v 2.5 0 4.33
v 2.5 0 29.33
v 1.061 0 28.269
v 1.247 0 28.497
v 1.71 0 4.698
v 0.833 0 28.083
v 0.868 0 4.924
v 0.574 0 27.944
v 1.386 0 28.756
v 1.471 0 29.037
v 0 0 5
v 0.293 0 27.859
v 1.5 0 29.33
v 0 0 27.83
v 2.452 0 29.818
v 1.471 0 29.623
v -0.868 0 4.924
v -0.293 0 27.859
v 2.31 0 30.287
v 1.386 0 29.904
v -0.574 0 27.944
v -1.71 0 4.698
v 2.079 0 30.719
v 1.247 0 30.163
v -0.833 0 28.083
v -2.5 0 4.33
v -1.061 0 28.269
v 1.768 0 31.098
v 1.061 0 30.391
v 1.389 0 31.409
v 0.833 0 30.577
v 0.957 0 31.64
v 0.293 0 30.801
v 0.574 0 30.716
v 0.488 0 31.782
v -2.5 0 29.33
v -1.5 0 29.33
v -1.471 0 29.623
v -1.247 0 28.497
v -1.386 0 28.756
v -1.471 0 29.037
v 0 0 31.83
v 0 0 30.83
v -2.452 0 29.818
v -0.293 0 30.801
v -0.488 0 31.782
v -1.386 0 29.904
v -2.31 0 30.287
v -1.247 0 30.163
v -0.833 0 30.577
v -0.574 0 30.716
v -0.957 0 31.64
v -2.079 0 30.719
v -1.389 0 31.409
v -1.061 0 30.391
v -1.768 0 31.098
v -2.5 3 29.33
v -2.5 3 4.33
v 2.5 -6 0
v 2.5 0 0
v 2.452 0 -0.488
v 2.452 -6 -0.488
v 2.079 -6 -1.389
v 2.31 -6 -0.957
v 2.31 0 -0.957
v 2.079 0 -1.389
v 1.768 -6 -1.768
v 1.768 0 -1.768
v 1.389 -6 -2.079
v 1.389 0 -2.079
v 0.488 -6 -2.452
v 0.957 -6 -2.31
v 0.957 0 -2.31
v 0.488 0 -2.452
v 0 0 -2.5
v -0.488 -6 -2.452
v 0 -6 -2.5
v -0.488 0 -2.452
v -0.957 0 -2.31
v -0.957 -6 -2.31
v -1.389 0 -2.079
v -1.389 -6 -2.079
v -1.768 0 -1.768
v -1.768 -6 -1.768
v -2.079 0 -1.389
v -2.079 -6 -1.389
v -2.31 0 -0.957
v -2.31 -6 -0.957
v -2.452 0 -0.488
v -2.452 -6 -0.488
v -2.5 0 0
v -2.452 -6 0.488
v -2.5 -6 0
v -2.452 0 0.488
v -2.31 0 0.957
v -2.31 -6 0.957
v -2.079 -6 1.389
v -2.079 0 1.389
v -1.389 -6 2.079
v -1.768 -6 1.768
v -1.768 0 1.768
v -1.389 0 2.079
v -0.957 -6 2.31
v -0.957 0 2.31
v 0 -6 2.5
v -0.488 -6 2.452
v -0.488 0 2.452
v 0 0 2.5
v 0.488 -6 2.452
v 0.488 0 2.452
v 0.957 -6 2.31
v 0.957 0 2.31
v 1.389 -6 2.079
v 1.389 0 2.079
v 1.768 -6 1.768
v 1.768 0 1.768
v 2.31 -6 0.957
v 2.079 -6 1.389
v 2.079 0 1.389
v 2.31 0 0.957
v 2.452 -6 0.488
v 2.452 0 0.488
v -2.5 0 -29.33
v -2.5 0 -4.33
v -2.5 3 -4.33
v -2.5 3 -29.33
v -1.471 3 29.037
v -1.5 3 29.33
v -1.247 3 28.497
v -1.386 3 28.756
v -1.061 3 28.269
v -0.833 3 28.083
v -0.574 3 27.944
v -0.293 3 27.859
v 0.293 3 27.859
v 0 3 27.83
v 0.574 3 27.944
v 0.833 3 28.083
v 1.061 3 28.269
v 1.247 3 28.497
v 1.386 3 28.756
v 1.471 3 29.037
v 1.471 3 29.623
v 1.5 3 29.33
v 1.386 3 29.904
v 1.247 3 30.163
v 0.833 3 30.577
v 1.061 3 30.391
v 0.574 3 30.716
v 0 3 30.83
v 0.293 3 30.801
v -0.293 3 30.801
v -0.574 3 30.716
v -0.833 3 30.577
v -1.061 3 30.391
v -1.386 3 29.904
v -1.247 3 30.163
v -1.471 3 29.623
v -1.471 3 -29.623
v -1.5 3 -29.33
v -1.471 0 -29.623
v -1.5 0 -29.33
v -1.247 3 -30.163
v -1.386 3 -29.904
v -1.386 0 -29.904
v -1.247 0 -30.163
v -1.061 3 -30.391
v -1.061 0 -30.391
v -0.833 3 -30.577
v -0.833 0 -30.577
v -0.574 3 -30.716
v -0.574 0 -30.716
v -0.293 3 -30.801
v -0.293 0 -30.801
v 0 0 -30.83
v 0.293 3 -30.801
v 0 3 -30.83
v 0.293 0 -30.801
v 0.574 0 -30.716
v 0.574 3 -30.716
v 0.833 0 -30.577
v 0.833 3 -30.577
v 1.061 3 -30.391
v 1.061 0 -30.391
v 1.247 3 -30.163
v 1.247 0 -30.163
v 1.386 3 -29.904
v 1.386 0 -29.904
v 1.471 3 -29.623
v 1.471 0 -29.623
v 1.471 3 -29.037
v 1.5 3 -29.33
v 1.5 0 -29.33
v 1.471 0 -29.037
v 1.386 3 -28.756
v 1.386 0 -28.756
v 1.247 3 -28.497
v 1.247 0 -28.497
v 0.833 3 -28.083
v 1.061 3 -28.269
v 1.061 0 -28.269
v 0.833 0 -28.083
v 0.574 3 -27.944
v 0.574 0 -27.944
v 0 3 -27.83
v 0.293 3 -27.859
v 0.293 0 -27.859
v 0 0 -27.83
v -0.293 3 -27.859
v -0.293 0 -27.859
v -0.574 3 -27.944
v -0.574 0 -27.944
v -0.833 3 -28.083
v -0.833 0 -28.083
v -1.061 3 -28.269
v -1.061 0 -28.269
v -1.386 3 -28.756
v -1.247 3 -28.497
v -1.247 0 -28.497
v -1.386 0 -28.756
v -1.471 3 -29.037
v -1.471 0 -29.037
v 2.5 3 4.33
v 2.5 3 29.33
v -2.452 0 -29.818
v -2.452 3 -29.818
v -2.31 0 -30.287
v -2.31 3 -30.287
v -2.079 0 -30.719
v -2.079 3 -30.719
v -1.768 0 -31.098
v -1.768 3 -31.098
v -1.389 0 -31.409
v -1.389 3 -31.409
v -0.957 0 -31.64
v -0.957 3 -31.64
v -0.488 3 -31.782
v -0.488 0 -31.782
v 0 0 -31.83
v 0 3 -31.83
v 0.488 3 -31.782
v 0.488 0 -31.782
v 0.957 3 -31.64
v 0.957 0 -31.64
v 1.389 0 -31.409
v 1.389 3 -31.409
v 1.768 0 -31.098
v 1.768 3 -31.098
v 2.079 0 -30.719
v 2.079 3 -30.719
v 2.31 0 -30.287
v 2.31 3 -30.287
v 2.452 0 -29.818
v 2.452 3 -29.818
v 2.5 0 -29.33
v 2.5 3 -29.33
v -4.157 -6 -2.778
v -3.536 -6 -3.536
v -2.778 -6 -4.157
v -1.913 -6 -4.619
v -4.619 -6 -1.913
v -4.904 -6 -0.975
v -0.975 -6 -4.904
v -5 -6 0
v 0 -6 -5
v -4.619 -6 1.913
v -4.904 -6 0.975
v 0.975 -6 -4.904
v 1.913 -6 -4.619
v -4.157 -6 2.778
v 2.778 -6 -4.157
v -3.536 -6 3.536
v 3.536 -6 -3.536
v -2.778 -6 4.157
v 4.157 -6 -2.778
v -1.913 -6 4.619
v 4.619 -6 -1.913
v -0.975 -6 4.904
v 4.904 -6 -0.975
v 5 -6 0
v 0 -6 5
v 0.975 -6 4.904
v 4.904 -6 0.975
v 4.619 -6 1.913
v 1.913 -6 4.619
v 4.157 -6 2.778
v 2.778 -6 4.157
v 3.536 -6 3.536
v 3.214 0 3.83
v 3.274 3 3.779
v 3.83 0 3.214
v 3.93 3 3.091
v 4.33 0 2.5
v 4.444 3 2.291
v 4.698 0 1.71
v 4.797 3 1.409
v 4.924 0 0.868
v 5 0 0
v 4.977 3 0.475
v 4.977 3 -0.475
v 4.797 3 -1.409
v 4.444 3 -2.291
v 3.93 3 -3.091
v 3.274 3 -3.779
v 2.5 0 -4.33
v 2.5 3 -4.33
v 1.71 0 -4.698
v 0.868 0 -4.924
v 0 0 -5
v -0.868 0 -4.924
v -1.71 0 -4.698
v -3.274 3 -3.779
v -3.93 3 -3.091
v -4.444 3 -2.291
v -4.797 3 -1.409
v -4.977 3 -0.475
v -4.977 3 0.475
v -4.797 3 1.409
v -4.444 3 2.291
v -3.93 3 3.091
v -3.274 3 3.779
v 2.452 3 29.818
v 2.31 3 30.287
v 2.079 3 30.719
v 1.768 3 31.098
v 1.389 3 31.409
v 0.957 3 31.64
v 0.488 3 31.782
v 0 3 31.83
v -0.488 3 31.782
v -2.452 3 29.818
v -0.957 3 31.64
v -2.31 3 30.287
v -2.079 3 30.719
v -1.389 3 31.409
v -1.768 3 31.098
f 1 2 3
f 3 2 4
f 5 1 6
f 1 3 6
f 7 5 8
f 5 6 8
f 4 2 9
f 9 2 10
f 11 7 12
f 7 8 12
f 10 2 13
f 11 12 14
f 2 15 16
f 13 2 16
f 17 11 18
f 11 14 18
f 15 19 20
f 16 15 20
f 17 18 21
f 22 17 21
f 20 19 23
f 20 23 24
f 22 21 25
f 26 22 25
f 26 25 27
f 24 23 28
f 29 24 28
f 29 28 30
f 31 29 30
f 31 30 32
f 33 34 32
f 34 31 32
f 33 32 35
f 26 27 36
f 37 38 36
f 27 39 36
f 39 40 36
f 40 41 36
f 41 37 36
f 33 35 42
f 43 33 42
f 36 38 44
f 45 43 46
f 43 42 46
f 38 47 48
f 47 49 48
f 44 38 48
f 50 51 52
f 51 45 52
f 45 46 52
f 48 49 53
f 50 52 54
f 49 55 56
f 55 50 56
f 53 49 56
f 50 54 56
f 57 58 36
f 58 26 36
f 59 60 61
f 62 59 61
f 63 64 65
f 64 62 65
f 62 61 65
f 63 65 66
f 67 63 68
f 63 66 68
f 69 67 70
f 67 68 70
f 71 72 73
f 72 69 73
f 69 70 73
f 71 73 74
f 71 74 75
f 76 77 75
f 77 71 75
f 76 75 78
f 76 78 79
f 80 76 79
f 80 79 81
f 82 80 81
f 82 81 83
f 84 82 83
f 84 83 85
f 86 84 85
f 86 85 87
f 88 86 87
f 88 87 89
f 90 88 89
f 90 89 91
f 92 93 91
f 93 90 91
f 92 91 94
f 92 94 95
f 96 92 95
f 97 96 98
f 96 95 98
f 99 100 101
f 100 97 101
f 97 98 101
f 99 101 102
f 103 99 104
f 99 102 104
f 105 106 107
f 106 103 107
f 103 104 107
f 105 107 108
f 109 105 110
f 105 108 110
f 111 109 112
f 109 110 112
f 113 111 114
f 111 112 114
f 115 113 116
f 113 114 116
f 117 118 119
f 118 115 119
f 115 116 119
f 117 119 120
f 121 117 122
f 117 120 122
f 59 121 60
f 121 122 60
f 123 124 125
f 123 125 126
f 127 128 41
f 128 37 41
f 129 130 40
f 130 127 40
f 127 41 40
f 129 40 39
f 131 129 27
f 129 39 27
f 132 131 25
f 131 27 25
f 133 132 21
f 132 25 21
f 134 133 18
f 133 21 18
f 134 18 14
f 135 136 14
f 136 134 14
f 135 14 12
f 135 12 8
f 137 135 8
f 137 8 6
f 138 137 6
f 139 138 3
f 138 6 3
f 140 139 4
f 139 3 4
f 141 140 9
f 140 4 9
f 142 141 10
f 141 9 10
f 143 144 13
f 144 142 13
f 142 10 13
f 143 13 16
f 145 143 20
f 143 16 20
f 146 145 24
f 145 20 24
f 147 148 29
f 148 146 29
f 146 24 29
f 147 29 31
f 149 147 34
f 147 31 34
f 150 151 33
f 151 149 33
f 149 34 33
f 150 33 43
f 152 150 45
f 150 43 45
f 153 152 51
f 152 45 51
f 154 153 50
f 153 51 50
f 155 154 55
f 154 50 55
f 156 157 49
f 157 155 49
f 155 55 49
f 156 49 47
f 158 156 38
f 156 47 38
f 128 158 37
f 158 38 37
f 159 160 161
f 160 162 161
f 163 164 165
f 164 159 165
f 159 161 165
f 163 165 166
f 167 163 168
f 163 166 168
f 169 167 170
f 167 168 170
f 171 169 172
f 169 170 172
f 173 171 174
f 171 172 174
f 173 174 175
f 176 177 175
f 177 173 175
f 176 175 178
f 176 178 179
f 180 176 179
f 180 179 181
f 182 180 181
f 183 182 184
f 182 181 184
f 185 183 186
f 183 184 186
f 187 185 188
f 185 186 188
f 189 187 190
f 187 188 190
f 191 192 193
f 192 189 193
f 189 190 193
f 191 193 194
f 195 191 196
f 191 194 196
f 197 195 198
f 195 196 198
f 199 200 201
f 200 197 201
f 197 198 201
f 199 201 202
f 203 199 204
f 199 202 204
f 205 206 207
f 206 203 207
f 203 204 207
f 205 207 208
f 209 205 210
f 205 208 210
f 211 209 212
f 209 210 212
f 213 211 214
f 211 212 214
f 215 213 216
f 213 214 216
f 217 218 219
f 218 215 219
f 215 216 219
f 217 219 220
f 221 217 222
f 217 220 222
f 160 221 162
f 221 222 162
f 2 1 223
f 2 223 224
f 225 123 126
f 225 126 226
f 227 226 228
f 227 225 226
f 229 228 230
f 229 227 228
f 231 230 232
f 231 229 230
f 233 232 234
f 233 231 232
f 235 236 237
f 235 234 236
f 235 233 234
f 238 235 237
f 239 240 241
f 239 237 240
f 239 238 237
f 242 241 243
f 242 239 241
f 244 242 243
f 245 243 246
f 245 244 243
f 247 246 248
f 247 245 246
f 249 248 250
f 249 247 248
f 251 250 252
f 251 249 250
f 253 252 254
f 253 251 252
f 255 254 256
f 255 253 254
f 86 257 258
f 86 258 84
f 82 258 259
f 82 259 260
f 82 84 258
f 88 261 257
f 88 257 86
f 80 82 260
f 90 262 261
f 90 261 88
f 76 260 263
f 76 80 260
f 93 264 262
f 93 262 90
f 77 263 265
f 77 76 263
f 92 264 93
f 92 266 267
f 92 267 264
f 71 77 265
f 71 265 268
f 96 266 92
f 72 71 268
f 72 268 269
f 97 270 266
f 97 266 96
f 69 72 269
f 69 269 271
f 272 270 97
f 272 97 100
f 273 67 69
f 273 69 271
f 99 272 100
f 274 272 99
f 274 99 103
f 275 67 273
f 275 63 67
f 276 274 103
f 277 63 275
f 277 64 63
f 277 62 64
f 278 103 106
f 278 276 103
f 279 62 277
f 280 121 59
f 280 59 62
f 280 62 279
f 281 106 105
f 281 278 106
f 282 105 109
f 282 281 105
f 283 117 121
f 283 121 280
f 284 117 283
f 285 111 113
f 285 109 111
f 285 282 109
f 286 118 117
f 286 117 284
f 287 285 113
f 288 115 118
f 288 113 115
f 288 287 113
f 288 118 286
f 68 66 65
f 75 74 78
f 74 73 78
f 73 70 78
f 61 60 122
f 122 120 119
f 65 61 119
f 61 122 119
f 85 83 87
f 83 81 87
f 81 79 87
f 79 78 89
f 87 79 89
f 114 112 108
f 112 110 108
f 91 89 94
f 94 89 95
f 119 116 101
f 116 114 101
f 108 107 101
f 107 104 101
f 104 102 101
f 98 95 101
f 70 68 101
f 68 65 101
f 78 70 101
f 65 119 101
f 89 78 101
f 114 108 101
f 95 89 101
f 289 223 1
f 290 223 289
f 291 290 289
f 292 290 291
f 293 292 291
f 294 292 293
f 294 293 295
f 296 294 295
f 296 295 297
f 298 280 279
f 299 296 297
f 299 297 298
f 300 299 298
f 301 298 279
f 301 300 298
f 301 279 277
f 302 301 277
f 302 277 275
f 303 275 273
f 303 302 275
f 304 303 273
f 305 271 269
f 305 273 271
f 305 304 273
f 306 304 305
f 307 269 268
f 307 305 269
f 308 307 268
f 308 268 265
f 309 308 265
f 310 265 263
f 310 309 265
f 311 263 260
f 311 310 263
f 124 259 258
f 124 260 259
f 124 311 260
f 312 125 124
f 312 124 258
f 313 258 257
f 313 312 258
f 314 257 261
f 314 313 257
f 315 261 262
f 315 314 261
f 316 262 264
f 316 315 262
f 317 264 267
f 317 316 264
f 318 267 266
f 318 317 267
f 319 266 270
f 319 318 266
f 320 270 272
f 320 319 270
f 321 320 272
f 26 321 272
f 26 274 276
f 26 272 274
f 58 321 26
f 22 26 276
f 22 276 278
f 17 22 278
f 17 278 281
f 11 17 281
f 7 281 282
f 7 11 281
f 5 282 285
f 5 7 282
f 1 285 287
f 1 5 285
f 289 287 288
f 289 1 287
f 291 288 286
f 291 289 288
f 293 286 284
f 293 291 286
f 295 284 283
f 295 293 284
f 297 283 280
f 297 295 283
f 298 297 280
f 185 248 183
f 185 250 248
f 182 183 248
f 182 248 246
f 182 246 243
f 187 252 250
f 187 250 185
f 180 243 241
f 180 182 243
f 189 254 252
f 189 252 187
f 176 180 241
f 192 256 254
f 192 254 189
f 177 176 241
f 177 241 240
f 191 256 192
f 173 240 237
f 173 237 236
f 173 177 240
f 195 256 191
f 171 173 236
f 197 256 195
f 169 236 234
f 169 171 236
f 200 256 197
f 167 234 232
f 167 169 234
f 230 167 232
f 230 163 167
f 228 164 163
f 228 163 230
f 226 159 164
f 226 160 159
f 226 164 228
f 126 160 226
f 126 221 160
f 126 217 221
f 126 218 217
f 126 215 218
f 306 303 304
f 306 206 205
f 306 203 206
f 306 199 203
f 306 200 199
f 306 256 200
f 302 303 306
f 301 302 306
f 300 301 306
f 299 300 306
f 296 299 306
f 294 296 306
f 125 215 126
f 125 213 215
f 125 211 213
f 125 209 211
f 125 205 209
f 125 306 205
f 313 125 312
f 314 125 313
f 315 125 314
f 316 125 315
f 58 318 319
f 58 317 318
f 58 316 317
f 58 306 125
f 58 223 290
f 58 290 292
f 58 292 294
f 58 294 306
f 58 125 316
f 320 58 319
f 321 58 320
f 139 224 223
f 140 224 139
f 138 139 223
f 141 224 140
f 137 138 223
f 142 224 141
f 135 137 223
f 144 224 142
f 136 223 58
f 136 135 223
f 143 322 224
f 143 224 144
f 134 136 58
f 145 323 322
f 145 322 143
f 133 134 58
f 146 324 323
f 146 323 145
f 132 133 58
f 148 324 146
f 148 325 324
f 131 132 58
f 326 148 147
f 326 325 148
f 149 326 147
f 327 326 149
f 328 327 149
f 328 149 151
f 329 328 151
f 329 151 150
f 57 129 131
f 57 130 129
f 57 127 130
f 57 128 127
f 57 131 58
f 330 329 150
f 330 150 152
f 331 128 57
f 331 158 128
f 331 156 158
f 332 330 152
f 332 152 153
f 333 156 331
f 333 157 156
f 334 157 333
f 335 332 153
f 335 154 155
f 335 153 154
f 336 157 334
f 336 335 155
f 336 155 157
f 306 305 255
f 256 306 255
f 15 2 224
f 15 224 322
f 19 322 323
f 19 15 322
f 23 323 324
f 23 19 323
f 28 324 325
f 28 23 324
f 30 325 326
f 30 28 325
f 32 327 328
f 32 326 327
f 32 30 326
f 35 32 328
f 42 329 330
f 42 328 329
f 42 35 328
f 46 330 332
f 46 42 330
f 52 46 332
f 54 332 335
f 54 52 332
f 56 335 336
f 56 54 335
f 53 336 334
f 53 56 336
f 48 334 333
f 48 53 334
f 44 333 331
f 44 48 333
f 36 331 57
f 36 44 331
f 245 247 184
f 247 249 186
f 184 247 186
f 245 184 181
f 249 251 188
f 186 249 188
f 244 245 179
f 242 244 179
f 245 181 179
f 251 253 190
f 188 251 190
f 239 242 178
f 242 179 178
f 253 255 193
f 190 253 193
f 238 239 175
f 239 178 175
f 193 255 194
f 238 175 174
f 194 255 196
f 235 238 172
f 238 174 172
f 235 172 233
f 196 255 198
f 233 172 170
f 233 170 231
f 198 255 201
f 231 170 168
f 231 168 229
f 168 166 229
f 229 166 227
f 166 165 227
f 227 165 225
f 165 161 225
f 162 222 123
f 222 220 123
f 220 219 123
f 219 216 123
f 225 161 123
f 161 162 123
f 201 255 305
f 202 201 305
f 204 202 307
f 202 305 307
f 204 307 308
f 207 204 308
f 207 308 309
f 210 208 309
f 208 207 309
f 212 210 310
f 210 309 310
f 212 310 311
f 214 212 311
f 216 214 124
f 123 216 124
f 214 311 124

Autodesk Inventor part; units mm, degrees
ref_plane "YZ Plane" through (0, 0, 0) normal (1, 0, 0) x (0, 1, 0)
ref_plane "XZ Plane" through (0, 0, 0) normal (0, 1, 0) x (-1, 0, 0)
ref_plane "XY Plane" through (0, 0, 0) normal (0, 0, 1) x (1, 0, 0)
sketch "Sketch1" plane through (0, 0, 0) normal (0, 1, 0) x (-1, 0, 0)
  circle A0 centre (0, 0) radius 5
  line L0 (2.5, 4.3301) -> (2.5, -4.3301)
  line L1 (-2.5, 4.3301) -> (-2.5, -4.3301)
  line L2 (-2.5, 4.3301) -> (-2.5, -4.3301)
  line L3 (-2.5, 4.3301) -> (-2.5, 29.3301)
  line L4 (-2.5, -4.3301) -> (-2.5, -29.3301)
  line L5 (2.5, -4.3301) -> (2.5, -29.3301)
  arc A1 (-2.5, -29.3301) -> (2.5, -29.3301) centre (0, -29.3301) ccw
  line L6 (2.5, 4.3301) -> (2.5, 29.3301)
  arc A2 (2.5, 29.3301) -> (-2.5, 29.3301) centre (0, 29.3301) ccw
  circle A3 centre (0, 29.3301) radius 1.5
  circle A4 centre (0, -29.3301) radius 1.5
  dimension "d0" = 10
  dimension "d1" = 5
  dimension "d2" = 2.5
  dimension "d18" = 25
  dimension "d19" = 25
  dimension "d20" = 25
  dimension "d21" = 3
  dimension "d22" = 3
  dimension "d23" = 25
  dimension "d24" = 2.5
extrude "Extrusion1" add sketch "Sketch1" along normal blind 3
sketch "Sketch2" plane through (0, 0, 0) normal (0, -1, 0) x (1, 0, 0)
  circle A0 centre (0, 0) radius 5
  circle A1 centre (0, 0) radius 2.5
  dimension "d14" = 5
  dimension "d15" = 10
extrude "Extrusion2" add sketch "Sketch2" along normal blind 6
equation "\"d2\" = 0.5 * d1"
properties part number "gripper_mechanism"
